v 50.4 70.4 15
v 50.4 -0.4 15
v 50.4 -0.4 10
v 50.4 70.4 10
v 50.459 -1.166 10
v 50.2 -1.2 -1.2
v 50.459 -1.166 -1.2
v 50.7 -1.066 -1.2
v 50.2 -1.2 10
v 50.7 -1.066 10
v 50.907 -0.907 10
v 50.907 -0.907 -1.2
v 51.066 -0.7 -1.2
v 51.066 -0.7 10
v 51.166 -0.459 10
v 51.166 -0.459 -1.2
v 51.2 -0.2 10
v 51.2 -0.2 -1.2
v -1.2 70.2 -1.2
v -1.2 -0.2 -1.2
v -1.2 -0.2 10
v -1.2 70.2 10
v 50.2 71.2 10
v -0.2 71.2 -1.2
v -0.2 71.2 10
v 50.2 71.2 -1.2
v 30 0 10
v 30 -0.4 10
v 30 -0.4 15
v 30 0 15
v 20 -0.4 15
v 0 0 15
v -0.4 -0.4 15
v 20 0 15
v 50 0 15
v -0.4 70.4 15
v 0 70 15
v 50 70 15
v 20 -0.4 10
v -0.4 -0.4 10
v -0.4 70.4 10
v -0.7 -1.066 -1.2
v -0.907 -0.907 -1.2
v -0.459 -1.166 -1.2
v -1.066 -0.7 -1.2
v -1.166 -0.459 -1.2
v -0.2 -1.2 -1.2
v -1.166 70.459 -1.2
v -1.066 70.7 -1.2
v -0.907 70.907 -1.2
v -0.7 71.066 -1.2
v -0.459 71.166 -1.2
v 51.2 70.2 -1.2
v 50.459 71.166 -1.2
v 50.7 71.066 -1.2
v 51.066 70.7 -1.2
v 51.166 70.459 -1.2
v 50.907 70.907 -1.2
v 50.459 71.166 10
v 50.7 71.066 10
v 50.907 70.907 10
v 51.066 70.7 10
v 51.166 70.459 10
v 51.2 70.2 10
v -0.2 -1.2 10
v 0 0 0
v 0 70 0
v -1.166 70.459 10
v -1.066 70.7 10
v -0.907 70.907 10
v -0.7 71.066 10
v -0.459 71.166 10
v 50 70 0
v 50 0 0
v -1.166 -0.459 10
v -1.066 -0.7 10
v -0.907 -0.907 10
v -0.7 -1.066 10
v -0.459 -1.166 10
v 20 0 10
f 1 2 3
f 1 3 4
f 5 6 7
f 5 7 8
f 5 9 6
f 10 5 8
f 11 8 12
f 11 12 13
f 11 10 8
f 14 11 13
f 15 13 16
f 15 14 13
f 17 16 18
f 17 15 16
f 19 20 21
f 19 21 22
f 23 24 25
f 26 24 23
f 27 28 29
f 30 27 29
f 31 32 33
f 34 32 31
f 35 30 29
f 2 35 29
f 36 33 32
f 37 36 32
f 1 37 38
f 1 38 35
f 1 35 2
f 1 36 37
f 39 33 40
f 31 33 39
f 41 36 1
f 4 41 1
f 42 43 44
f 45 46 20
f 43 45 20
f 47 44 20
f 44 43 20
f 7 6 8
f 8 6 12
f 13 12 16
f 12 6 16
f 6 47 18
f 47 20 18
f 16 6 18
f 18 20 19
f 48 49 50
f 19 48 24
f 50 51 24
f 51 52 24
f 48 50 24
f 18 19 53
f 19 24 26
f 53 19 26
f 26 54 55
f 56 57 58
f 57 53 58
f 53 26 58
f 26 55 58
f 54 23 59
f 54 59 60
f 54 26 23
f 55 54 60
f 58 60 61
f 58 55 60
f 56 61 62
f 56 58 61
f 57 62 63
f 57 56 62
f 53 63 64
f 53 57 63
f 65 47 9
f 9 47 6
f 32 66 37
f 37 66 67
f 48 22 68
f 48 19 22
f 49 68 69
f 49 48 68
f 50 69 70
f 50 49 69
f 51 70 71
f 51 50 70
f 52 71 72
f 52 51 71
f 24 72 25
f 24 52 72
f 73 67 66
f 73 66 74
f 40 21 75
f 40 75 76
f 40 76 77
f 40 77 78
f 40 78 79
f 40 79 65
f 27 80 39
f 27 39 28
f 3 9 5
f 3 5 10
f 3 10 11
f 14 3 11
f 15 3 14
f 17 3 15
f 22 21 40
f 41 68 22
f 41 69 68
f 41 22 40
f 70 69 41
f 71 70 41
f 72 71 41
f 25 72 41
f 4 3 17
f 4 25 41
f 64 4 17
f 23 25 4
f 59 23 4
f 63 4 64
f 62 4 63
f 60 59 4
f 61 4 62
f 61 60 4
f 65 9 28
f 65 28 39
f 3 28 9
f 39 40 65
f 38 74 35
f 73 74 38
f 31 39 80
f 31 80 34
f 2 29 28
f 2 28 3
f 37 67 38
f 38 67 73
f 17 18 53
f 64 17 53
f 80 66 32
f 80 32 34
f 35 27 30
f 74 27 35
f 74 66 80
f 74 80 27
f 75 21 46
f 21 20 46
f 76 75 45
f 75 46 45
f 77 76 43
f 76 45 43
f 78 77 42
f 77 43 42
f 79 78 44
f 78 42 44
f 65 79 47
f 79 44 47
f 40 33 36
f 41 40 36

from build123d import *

# Parameters (mm, degrees)
F0_W     = 50
F0_H     = 70
F1_DEPTH = 15
F2_T     = 1.2
F3_W     = 52.4
F3_H     = 72.4
F3_W_2   = 50.8
F3_H_2   = 70.8
F4_DEPTH = 5
F5_R     = 1
F6_W     = 10
F6_H     = 10
F7_DEPTH = 25


with BuildPart() as f1:
    # F0 (on Top) → F1 (new body)
    with BuildSketch(Plane.XY):
        with Locations((25, 35)):
            Rectangle(F0_W, F0_H)
    extrude(amount=F1_DEPTH)

    # F2
    f2_openings = [f1.faces().sort_by_distance(p)[0] for p in [
        (25, 35, 15),
    ]]
    offset(amount=F2_T, openings=f2_openings, kind=Kind.INTERSECTION)

    # F3 (on face) → F4 (cut)
    with BuildSketch(Plane.XY.offset(15)):
        with Locations((25, 35)):
            Rectangle(F3_W, F3_H)
        with Locations((25, 35)):
            Rectangle(F3_W_2, F3_H_2, mode=Mode.SUBTRACT)
    extrude(amount=-F4_DEPTH, mode=Mode.SUBTRACT)

    # F5
    f5_edges = [f1.edges().sort_by_distance(p)[0] for p in [
        (-1.2, 71.2, 4.4),
        (-1.2, -1.2, 4.4),
        (51.2, -1.2, 4.4),
        (51.2, 71.2, 4.4),
    ]]
    fillet(f5_edges, radius=F5_R)

    # F6 (on face) → F7 (cut)
    with BuildSketch(Plane.XZ.offset(1.2)):
        with Locations((25, 15)):
            Rectangle(F6_W, F6_H)
    extrude(amount=-F7_DEPTH, mode=Mode.SUBTRACT)


solid = f1.part
